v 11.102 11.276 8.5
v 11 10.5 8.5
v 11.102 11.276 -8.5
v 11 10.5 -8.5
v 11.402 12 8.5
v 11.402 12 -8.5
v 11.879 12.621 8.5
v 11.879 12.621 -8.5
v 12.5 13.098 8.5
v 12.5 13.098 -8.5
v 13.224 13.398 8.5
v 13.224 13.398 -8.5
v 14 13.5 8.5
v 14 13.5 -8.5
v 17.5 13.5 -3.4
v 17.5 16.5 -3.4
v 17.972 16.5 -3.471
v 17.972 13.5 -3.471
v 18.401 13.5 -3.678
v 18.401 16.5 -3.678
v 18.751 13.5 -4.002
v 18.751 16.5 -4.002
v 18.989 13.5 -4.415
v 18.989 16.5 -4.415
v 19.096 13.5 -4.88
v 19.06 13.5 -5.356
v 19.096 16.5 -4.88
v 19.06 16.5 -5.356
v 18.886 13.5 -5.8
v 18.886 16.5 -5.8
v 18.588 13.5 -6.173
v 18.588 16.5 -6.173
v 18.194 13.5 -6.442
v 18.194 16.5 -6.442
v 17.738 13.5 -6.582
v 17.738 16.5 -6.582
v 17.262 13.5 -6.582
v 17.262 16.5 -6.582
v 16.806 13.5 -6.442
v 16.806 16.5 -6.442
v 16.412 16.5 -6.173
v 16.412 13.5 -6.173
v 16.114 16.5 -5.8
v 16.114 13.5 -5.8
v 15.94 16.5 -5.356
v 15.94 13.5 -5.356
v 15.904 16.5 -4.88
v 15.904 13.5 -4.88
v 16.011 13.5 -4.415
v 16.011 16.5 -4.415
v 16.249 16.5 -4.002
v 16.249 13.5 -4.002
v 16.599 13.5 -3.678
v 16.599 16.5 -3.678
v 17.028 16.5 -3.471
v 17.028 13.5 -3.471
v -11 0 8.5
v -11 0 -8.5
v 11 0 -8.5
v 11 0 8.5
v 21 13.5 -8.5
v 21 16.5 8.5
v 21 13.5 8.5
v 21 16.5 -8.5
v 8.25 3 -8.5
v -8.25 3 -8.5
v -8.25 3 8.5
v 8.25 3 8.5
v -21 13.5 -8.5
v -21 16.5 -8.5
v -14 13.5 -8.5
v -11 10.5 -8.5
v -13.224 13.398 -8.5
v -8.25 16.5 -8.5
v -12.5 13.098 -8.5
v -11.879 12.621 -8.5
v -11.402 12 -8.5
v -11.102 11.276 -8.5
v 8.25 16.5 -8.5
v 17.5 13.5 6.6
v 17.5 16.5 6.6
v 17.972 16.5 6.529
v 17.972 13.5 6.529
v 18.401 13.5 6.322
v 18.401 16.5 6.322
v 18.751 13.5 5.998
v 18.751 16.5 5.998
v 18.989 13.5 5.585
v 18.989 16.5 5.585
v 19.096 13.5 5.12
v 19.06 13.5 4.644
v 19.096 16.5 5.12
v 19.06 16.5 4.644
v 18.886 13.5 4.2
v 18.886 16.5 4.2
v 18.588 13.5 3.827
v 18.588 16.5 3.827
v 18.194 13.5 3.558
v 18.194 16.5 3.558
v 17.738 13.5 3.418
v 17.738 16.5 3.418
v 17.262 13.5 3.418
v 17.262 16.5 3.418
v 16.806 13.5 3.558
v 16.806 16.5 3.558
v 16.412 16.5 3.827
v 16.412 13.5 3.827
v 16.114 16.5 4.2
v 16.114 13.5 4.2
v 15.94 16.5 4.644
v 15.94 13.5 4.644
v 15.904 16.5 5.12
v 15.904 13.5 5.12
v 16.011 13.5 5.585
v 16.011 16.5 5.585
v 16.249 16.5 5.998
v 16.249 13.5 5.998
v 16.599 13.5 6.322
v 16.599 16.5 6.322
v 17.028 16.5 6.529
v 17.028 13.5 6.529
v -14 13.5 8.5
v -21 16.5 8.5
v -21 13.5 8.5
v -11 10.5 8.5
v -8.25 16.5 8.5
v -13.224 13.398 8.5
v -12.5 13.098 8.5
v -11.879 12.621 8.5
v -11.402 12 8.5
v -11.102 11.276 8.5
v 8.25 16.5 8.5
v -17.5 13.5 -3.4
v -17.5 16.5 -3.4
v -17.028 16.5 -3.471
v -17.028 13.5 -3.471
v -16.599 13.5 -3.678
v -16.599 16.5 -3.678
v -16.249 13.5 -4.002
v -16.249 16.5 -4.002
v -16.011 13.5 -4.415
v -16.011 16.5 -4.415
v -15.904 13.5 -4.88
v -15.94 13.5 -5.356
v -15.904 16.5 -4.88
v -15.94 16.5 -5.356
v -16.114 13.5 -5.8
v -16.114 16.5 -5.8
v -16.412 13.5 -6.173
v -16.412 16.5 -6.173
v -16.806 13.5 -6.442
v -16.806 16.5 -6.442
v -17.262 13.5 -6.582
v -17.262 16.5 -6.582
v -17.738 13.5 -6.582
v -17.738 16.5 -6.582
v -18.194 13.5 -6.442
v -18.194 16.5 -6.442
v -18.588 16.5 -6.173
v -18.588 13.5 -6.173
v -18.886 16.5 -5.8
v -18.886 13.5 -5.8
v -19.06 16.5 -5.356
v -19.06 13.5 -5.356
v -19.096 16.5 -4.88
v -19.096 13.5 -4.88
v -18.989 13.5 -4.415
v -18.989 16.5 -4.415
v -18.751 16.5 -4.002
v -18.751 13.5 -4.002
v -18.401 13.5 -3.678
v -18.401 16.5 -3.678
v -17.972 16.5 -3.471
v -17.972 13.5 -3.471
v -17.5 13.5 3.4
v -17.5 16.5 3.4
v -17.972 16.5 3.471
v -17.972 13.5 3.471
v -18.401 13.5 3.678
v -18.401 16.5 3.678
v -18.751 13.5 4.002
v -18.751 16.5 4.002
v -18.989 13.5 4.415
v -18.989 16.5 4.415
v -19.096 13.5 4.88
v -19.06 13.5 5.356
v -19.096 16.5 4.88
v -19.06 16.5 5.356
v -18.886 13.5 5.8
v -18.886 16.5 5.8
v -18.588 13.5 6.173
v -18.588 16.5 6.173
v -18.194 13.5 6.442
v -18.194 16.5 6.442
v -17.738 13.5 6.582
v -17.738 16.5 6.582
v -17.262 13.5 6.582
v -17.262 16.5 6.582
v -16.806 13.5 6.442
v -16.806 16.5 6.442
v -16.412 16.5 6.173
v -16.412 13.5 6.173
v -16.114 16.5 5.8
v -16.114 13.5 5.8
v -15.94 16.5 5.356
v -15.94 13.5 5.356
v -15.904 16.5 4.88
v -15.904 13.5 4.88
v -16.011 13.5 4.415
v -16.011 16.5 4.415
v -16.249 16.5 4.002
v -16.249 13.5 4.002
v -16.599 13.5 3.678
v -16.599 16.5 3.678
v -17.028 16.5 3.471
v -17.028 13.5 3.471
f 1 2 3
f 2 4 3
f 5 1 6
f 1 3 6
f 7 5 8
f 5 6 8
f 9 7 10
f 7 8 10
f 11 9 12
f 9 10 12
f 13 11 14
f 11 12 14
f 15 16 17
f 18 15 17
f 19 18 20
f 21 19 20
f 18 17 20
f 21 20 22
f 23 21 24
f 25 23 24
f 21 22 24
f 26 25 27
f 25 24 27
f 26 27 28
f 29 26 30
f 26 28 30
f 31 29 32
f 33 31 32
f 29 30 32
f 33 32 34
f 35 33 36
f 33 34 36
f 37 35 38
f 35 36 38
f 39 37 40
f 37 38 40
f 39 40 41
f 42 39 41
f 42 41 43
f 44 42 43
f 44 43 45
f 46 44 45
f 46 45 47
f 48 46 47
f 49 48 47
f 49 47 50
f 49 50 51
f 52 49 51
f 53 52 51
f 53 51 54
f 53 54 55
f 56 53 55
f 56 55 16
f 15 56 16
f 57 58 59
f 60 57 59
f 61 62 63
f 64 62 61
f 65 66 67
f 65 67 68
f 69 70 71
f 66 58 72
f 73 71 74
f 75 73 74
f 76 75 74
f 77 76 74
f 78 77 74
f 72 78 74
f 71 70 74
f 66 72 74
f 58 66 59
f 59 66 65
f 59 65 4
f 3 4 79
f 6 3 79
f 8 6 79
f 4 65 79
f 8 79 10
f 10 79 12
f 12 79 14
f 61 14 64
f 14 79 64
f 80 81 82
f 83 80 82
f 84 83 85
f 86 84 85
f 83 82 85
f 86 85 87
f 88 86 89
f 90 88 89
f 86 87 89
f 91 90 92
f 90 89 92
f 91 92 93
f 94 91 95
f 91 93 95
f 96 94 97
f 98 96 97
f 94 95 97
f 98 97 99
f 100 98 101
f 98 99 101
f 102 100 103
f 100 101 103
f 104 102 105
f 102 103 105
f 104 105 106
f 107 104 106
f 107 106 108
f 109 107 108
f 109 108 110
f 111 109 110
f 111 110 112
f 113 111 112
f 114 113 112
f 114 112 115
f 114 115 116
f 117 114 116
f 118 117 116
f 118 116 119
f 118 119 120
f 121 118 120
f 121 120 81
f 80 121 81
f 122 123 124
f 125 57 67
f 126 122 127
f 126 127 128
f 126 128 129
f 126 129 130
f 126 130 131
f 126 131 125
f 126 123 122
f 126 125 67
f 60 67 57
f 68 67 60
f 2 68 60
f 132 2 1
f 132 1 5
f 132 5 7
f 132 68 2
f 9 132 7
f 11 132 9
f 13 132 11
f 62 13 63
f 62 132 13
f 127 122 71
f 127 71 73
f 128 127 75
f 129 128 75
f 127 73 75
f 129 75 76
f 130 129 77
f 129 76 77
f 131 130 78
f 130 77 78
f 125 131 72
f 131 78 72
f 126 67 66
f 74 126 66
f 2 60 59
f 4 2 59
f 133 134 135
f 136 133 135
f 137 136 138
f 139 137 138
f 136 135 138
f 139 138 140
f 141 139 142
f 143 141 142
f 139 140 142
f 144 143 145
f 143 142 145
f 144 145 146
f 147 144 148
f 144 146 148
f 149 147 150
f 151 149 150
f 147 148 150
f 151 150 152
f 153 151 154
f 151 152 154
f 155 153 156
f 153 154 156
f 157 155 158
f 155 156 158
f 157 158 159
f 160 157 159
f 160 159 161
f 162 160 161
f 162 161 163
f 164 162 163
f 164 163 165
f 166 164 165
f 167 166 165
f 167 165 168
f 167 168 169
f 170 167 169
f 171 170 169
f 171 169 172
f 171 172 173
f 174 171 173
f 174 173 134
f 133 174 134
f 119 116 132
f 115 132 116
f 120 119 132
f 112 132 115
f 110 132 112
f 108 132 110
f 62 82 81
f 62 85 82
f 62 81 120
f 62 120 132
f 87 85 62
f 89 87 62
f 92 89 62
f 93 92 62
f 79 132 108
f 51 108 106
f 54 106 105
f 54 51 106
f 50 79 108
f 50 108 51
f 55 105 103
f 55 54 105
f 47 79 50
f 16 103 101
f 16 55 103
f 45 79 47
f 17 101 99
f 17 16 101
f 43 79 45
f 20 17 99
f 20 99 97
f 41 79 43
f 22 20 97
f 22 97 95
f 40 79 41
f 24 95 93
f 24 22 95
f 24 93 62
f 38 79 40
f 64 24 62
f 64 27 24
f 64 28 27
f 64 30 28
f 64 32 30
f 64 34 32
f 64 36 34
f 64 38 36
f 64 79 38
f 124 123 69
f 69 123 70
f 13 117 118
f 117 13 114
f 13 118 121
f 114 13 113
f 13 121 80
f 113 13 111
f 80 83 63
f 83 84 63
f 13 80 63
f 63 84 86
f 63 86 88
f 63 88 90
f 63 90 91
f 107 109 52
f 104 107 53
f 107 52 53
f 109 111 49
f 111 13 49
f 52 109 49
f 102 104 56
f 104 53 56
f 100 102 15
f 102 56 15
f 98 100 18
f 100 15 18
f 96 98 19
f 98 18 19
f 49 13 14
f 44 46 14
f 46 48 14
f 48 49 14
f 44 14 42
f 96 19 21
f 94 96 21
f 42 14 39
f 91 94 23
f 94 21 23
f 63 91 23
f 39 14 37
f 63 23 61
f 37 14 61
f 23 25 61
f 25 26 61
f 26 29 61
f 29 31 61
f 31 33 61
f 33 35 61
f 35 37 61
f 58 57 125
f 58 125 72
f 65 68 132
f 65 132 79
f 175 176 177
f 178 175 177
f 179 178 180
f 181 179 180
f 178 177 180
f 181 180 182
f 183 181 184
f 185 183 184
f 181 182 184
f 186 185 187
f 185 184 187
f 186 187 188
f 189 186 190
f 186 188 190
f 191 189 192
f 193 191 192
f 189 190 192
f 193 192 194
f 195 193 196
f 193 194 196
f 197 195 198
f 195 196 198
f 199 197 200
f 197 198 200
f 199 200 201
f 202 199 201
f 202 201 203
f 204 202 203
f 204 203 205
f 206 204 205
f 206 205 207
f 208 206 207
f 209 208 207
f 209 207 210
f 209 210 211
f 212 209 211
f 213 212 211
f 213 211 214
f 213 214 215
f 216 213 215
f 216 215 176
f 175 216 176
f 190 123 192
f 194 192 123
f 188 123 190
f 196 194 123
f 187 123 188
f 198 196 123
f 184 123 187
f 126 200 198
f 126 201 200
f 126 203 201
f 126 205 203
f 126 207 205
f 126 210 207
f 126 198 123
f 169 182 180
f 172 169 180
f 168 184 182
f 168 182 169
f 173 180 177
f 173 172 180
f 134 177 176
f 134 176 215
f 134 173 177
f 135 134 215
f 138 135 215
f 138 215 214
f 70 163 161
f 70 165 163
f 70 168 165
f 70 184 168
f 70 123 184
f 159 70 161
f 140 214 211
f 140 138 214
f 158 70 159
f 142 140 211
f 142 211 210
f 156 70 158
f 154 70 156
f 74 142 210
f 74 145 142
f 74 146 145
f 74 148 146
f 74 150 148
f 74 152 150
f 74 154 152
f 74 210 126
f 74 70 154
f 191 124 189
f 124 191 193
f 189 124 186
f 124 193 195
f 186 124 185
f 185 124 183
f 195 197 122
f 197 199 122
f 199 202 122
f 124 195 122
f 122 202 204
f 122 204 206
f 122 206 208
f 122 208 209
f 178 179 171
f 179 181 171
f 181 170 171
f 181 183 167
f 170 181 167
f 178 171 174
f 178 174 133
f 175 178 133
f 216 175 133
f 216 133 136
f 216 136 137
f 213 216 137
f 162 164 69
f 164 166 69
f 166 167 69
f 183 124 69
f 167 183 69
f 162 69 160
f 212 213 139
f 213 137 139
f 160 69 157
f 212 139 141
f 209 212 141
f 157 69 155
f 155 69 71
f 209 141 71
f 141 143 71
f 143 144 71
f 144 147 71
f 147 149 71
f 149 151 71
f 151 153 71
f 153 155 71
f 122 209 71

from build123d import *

# Parameters (mm, degrees)
SKETCH_1_W          = 22
SKETCH_1_H          = 17
EXTRUDE_1_DEPTH     = 3
SKETCH_2_W          = 2.75
SKETCH_2_H          = 17
EXTRUDE_2_DEPTH     = 13.5
SKETCH_3_W          = 10
SKETCH_3_H          = 17
EXTRUDE_3_DEPTH     = 3
CUT_EXTRUDE_1_REACH = 30.027
SKETCH_4_R          = 1.6
FILLET_1_R          = 3


with BuildPart() as part:
    # 草图1 → 凸台-拉伸1 (new body)
    with BuildSketch(Plane(origin=(0, 0, 0), x_dir=(1, 0, 0), z_dir=(0, 1, 0))):
        Rectangle(SKETCH_1_W, SKETCH_1_H)
    extrude(amount=EXTRUDE_1_DEPTH)

    # 草图2 → 凸台-拉伸2 (add)
    with BuildSketch(Plane(origin=(0, 3, 0), x_dir=(1, 0, 0), z_dir=(0, 1, 0))):
        with Locations((-9.625, 0)):
            Rectangle(SKETCH_2_W, SKETCH_2_H)
        with Locations((9.625, 0)):
            Rectangle(SKETCH_2_W, SKETCH_2_H)
    extrude(amount=EXTRUDE_2_DEPTH)

    # 草图3 → 凸台-拉伸3 (add)
    with BuildSketch(Plane(origin=(0, 16.5, 0), x_dir=(1, 0, 0), z_dir=(0, 1, 0))):
        with Locations((16, 0)):
            Rectangle(SKETCH_3_W, SKETCH_3_H)
        with Locations((-16, 0)):
            Rectangle(SKETCH_3_W, SKETCH_3_H)
    extrude(amount=-EXTRUDE_3_DEPTH)

    # 草图4 → 切除-拉伸1 (cut, up to next)
    with BuildSketch(Plane(origin=(0, 16.5, 0), x_dir=(1, 0, 0), z_dir=(0, 1, 0)), mode=Mode.PRIVATE) as cut_extrude_1_sk1:
        with Locations(Location((-17.5, 5, 0), (0, 0, 270))):
            Circle(SKETCH_4_R)
    cut_extrude_1_tool1 = extrude(cut_extrude_1_sk1.sketch, amount=-CUT_EXTRUDE_1_REACH, mode=Mode.PRIVATE) & part.part
    # 草图4 → 切除-拉伸1 (cut, up to next)
    with BuildSketch(Plane(origin=(0, 16.5, 0), x_dir=(1, 0, 0), z_dir=(0, 1, 0)), mode=Mode.PRIVATE) as cut_extrude_1_sk2:
        with Locations(Location((-17.5, -5, 0), (0, 0, 90))):
            Circle(SKETCH_4_R)
    cut_extrude_1_tool2 = extrude(cut_extrude_1_sk2.sketch, amount=-CUT_EXTRUDE_1_REACH, mode=Mode.PRIVATE) & part.part
    # 草图4 → 切除-拉伸1 (cut, up to next)
    with BuildSketch(Plane(origin=(0, 16.5, 0), x_dir=(1, 0, 0), z_dir=(0, 1, 0)), mode=Mode.PRIVATE) as cut_extrude_1_sk3:
        with Locations(Location((17.5, -5, 0), (0, 0, 270))):
            Circle(SKETCH_4_R)
    cut_extrude_1_tool3 = extrude(cut_extrude_1_sk3.sketch, amount=-CUT_EXTRUDE_1_REACH, mode=Mode.PRIVATE) & part.part
    # 草图4 → 切除-拉伸1 (cut, up to next)
    with BuildSketch(Plane(origin=(0, 16.5, 0), x_dir=(1, 0, 0), z_dir=(0, 1, 0)), mode=Mode.PRIVATE) as cut_extrude_1_sk4:
        with Locations(Location((17.5, 5, 0), (0, 0, 270))):
            Circle(SKETCH_4_R)
    cut_extrude_1_tool4 = extrude(cut_extrude_1_sk4.sketch, amount=-CUT_EXTRUDE_1_REACH, mode=Mode.PRIVATE) & part.part
    add(cut_extrude_1_tool1.solids().sort_by_distance((-17.5, 16.5, -5))[0], mode=Mode.SUBTRACT)
    add(cut_extrude_1_tool2.solids().sort_by_distance((-17.5, 16.5, 5))[0], mode=Mode.SUBTRACT)
    add(cut_extrude_1_tool3.solids().sort_by_distance((17.5, 16.5, 5))[0], mode=Mode.SUBTRACT)
    add(cut_extrude_1_tool4.solids().sort_by_distance((17.5, 16.5, -5))[0], mode=Mode.SUBTRACT)

    # 圆角1
    fillet_1_edges = [part.edges().sort_by_distance(p)[0] for p in [
        (11, 13.5, 0),
        (-11, 13.5, 0),
    ]]
    fillet(fillet_1_edges, radius=FILLET_1_R)


solid = part.part
